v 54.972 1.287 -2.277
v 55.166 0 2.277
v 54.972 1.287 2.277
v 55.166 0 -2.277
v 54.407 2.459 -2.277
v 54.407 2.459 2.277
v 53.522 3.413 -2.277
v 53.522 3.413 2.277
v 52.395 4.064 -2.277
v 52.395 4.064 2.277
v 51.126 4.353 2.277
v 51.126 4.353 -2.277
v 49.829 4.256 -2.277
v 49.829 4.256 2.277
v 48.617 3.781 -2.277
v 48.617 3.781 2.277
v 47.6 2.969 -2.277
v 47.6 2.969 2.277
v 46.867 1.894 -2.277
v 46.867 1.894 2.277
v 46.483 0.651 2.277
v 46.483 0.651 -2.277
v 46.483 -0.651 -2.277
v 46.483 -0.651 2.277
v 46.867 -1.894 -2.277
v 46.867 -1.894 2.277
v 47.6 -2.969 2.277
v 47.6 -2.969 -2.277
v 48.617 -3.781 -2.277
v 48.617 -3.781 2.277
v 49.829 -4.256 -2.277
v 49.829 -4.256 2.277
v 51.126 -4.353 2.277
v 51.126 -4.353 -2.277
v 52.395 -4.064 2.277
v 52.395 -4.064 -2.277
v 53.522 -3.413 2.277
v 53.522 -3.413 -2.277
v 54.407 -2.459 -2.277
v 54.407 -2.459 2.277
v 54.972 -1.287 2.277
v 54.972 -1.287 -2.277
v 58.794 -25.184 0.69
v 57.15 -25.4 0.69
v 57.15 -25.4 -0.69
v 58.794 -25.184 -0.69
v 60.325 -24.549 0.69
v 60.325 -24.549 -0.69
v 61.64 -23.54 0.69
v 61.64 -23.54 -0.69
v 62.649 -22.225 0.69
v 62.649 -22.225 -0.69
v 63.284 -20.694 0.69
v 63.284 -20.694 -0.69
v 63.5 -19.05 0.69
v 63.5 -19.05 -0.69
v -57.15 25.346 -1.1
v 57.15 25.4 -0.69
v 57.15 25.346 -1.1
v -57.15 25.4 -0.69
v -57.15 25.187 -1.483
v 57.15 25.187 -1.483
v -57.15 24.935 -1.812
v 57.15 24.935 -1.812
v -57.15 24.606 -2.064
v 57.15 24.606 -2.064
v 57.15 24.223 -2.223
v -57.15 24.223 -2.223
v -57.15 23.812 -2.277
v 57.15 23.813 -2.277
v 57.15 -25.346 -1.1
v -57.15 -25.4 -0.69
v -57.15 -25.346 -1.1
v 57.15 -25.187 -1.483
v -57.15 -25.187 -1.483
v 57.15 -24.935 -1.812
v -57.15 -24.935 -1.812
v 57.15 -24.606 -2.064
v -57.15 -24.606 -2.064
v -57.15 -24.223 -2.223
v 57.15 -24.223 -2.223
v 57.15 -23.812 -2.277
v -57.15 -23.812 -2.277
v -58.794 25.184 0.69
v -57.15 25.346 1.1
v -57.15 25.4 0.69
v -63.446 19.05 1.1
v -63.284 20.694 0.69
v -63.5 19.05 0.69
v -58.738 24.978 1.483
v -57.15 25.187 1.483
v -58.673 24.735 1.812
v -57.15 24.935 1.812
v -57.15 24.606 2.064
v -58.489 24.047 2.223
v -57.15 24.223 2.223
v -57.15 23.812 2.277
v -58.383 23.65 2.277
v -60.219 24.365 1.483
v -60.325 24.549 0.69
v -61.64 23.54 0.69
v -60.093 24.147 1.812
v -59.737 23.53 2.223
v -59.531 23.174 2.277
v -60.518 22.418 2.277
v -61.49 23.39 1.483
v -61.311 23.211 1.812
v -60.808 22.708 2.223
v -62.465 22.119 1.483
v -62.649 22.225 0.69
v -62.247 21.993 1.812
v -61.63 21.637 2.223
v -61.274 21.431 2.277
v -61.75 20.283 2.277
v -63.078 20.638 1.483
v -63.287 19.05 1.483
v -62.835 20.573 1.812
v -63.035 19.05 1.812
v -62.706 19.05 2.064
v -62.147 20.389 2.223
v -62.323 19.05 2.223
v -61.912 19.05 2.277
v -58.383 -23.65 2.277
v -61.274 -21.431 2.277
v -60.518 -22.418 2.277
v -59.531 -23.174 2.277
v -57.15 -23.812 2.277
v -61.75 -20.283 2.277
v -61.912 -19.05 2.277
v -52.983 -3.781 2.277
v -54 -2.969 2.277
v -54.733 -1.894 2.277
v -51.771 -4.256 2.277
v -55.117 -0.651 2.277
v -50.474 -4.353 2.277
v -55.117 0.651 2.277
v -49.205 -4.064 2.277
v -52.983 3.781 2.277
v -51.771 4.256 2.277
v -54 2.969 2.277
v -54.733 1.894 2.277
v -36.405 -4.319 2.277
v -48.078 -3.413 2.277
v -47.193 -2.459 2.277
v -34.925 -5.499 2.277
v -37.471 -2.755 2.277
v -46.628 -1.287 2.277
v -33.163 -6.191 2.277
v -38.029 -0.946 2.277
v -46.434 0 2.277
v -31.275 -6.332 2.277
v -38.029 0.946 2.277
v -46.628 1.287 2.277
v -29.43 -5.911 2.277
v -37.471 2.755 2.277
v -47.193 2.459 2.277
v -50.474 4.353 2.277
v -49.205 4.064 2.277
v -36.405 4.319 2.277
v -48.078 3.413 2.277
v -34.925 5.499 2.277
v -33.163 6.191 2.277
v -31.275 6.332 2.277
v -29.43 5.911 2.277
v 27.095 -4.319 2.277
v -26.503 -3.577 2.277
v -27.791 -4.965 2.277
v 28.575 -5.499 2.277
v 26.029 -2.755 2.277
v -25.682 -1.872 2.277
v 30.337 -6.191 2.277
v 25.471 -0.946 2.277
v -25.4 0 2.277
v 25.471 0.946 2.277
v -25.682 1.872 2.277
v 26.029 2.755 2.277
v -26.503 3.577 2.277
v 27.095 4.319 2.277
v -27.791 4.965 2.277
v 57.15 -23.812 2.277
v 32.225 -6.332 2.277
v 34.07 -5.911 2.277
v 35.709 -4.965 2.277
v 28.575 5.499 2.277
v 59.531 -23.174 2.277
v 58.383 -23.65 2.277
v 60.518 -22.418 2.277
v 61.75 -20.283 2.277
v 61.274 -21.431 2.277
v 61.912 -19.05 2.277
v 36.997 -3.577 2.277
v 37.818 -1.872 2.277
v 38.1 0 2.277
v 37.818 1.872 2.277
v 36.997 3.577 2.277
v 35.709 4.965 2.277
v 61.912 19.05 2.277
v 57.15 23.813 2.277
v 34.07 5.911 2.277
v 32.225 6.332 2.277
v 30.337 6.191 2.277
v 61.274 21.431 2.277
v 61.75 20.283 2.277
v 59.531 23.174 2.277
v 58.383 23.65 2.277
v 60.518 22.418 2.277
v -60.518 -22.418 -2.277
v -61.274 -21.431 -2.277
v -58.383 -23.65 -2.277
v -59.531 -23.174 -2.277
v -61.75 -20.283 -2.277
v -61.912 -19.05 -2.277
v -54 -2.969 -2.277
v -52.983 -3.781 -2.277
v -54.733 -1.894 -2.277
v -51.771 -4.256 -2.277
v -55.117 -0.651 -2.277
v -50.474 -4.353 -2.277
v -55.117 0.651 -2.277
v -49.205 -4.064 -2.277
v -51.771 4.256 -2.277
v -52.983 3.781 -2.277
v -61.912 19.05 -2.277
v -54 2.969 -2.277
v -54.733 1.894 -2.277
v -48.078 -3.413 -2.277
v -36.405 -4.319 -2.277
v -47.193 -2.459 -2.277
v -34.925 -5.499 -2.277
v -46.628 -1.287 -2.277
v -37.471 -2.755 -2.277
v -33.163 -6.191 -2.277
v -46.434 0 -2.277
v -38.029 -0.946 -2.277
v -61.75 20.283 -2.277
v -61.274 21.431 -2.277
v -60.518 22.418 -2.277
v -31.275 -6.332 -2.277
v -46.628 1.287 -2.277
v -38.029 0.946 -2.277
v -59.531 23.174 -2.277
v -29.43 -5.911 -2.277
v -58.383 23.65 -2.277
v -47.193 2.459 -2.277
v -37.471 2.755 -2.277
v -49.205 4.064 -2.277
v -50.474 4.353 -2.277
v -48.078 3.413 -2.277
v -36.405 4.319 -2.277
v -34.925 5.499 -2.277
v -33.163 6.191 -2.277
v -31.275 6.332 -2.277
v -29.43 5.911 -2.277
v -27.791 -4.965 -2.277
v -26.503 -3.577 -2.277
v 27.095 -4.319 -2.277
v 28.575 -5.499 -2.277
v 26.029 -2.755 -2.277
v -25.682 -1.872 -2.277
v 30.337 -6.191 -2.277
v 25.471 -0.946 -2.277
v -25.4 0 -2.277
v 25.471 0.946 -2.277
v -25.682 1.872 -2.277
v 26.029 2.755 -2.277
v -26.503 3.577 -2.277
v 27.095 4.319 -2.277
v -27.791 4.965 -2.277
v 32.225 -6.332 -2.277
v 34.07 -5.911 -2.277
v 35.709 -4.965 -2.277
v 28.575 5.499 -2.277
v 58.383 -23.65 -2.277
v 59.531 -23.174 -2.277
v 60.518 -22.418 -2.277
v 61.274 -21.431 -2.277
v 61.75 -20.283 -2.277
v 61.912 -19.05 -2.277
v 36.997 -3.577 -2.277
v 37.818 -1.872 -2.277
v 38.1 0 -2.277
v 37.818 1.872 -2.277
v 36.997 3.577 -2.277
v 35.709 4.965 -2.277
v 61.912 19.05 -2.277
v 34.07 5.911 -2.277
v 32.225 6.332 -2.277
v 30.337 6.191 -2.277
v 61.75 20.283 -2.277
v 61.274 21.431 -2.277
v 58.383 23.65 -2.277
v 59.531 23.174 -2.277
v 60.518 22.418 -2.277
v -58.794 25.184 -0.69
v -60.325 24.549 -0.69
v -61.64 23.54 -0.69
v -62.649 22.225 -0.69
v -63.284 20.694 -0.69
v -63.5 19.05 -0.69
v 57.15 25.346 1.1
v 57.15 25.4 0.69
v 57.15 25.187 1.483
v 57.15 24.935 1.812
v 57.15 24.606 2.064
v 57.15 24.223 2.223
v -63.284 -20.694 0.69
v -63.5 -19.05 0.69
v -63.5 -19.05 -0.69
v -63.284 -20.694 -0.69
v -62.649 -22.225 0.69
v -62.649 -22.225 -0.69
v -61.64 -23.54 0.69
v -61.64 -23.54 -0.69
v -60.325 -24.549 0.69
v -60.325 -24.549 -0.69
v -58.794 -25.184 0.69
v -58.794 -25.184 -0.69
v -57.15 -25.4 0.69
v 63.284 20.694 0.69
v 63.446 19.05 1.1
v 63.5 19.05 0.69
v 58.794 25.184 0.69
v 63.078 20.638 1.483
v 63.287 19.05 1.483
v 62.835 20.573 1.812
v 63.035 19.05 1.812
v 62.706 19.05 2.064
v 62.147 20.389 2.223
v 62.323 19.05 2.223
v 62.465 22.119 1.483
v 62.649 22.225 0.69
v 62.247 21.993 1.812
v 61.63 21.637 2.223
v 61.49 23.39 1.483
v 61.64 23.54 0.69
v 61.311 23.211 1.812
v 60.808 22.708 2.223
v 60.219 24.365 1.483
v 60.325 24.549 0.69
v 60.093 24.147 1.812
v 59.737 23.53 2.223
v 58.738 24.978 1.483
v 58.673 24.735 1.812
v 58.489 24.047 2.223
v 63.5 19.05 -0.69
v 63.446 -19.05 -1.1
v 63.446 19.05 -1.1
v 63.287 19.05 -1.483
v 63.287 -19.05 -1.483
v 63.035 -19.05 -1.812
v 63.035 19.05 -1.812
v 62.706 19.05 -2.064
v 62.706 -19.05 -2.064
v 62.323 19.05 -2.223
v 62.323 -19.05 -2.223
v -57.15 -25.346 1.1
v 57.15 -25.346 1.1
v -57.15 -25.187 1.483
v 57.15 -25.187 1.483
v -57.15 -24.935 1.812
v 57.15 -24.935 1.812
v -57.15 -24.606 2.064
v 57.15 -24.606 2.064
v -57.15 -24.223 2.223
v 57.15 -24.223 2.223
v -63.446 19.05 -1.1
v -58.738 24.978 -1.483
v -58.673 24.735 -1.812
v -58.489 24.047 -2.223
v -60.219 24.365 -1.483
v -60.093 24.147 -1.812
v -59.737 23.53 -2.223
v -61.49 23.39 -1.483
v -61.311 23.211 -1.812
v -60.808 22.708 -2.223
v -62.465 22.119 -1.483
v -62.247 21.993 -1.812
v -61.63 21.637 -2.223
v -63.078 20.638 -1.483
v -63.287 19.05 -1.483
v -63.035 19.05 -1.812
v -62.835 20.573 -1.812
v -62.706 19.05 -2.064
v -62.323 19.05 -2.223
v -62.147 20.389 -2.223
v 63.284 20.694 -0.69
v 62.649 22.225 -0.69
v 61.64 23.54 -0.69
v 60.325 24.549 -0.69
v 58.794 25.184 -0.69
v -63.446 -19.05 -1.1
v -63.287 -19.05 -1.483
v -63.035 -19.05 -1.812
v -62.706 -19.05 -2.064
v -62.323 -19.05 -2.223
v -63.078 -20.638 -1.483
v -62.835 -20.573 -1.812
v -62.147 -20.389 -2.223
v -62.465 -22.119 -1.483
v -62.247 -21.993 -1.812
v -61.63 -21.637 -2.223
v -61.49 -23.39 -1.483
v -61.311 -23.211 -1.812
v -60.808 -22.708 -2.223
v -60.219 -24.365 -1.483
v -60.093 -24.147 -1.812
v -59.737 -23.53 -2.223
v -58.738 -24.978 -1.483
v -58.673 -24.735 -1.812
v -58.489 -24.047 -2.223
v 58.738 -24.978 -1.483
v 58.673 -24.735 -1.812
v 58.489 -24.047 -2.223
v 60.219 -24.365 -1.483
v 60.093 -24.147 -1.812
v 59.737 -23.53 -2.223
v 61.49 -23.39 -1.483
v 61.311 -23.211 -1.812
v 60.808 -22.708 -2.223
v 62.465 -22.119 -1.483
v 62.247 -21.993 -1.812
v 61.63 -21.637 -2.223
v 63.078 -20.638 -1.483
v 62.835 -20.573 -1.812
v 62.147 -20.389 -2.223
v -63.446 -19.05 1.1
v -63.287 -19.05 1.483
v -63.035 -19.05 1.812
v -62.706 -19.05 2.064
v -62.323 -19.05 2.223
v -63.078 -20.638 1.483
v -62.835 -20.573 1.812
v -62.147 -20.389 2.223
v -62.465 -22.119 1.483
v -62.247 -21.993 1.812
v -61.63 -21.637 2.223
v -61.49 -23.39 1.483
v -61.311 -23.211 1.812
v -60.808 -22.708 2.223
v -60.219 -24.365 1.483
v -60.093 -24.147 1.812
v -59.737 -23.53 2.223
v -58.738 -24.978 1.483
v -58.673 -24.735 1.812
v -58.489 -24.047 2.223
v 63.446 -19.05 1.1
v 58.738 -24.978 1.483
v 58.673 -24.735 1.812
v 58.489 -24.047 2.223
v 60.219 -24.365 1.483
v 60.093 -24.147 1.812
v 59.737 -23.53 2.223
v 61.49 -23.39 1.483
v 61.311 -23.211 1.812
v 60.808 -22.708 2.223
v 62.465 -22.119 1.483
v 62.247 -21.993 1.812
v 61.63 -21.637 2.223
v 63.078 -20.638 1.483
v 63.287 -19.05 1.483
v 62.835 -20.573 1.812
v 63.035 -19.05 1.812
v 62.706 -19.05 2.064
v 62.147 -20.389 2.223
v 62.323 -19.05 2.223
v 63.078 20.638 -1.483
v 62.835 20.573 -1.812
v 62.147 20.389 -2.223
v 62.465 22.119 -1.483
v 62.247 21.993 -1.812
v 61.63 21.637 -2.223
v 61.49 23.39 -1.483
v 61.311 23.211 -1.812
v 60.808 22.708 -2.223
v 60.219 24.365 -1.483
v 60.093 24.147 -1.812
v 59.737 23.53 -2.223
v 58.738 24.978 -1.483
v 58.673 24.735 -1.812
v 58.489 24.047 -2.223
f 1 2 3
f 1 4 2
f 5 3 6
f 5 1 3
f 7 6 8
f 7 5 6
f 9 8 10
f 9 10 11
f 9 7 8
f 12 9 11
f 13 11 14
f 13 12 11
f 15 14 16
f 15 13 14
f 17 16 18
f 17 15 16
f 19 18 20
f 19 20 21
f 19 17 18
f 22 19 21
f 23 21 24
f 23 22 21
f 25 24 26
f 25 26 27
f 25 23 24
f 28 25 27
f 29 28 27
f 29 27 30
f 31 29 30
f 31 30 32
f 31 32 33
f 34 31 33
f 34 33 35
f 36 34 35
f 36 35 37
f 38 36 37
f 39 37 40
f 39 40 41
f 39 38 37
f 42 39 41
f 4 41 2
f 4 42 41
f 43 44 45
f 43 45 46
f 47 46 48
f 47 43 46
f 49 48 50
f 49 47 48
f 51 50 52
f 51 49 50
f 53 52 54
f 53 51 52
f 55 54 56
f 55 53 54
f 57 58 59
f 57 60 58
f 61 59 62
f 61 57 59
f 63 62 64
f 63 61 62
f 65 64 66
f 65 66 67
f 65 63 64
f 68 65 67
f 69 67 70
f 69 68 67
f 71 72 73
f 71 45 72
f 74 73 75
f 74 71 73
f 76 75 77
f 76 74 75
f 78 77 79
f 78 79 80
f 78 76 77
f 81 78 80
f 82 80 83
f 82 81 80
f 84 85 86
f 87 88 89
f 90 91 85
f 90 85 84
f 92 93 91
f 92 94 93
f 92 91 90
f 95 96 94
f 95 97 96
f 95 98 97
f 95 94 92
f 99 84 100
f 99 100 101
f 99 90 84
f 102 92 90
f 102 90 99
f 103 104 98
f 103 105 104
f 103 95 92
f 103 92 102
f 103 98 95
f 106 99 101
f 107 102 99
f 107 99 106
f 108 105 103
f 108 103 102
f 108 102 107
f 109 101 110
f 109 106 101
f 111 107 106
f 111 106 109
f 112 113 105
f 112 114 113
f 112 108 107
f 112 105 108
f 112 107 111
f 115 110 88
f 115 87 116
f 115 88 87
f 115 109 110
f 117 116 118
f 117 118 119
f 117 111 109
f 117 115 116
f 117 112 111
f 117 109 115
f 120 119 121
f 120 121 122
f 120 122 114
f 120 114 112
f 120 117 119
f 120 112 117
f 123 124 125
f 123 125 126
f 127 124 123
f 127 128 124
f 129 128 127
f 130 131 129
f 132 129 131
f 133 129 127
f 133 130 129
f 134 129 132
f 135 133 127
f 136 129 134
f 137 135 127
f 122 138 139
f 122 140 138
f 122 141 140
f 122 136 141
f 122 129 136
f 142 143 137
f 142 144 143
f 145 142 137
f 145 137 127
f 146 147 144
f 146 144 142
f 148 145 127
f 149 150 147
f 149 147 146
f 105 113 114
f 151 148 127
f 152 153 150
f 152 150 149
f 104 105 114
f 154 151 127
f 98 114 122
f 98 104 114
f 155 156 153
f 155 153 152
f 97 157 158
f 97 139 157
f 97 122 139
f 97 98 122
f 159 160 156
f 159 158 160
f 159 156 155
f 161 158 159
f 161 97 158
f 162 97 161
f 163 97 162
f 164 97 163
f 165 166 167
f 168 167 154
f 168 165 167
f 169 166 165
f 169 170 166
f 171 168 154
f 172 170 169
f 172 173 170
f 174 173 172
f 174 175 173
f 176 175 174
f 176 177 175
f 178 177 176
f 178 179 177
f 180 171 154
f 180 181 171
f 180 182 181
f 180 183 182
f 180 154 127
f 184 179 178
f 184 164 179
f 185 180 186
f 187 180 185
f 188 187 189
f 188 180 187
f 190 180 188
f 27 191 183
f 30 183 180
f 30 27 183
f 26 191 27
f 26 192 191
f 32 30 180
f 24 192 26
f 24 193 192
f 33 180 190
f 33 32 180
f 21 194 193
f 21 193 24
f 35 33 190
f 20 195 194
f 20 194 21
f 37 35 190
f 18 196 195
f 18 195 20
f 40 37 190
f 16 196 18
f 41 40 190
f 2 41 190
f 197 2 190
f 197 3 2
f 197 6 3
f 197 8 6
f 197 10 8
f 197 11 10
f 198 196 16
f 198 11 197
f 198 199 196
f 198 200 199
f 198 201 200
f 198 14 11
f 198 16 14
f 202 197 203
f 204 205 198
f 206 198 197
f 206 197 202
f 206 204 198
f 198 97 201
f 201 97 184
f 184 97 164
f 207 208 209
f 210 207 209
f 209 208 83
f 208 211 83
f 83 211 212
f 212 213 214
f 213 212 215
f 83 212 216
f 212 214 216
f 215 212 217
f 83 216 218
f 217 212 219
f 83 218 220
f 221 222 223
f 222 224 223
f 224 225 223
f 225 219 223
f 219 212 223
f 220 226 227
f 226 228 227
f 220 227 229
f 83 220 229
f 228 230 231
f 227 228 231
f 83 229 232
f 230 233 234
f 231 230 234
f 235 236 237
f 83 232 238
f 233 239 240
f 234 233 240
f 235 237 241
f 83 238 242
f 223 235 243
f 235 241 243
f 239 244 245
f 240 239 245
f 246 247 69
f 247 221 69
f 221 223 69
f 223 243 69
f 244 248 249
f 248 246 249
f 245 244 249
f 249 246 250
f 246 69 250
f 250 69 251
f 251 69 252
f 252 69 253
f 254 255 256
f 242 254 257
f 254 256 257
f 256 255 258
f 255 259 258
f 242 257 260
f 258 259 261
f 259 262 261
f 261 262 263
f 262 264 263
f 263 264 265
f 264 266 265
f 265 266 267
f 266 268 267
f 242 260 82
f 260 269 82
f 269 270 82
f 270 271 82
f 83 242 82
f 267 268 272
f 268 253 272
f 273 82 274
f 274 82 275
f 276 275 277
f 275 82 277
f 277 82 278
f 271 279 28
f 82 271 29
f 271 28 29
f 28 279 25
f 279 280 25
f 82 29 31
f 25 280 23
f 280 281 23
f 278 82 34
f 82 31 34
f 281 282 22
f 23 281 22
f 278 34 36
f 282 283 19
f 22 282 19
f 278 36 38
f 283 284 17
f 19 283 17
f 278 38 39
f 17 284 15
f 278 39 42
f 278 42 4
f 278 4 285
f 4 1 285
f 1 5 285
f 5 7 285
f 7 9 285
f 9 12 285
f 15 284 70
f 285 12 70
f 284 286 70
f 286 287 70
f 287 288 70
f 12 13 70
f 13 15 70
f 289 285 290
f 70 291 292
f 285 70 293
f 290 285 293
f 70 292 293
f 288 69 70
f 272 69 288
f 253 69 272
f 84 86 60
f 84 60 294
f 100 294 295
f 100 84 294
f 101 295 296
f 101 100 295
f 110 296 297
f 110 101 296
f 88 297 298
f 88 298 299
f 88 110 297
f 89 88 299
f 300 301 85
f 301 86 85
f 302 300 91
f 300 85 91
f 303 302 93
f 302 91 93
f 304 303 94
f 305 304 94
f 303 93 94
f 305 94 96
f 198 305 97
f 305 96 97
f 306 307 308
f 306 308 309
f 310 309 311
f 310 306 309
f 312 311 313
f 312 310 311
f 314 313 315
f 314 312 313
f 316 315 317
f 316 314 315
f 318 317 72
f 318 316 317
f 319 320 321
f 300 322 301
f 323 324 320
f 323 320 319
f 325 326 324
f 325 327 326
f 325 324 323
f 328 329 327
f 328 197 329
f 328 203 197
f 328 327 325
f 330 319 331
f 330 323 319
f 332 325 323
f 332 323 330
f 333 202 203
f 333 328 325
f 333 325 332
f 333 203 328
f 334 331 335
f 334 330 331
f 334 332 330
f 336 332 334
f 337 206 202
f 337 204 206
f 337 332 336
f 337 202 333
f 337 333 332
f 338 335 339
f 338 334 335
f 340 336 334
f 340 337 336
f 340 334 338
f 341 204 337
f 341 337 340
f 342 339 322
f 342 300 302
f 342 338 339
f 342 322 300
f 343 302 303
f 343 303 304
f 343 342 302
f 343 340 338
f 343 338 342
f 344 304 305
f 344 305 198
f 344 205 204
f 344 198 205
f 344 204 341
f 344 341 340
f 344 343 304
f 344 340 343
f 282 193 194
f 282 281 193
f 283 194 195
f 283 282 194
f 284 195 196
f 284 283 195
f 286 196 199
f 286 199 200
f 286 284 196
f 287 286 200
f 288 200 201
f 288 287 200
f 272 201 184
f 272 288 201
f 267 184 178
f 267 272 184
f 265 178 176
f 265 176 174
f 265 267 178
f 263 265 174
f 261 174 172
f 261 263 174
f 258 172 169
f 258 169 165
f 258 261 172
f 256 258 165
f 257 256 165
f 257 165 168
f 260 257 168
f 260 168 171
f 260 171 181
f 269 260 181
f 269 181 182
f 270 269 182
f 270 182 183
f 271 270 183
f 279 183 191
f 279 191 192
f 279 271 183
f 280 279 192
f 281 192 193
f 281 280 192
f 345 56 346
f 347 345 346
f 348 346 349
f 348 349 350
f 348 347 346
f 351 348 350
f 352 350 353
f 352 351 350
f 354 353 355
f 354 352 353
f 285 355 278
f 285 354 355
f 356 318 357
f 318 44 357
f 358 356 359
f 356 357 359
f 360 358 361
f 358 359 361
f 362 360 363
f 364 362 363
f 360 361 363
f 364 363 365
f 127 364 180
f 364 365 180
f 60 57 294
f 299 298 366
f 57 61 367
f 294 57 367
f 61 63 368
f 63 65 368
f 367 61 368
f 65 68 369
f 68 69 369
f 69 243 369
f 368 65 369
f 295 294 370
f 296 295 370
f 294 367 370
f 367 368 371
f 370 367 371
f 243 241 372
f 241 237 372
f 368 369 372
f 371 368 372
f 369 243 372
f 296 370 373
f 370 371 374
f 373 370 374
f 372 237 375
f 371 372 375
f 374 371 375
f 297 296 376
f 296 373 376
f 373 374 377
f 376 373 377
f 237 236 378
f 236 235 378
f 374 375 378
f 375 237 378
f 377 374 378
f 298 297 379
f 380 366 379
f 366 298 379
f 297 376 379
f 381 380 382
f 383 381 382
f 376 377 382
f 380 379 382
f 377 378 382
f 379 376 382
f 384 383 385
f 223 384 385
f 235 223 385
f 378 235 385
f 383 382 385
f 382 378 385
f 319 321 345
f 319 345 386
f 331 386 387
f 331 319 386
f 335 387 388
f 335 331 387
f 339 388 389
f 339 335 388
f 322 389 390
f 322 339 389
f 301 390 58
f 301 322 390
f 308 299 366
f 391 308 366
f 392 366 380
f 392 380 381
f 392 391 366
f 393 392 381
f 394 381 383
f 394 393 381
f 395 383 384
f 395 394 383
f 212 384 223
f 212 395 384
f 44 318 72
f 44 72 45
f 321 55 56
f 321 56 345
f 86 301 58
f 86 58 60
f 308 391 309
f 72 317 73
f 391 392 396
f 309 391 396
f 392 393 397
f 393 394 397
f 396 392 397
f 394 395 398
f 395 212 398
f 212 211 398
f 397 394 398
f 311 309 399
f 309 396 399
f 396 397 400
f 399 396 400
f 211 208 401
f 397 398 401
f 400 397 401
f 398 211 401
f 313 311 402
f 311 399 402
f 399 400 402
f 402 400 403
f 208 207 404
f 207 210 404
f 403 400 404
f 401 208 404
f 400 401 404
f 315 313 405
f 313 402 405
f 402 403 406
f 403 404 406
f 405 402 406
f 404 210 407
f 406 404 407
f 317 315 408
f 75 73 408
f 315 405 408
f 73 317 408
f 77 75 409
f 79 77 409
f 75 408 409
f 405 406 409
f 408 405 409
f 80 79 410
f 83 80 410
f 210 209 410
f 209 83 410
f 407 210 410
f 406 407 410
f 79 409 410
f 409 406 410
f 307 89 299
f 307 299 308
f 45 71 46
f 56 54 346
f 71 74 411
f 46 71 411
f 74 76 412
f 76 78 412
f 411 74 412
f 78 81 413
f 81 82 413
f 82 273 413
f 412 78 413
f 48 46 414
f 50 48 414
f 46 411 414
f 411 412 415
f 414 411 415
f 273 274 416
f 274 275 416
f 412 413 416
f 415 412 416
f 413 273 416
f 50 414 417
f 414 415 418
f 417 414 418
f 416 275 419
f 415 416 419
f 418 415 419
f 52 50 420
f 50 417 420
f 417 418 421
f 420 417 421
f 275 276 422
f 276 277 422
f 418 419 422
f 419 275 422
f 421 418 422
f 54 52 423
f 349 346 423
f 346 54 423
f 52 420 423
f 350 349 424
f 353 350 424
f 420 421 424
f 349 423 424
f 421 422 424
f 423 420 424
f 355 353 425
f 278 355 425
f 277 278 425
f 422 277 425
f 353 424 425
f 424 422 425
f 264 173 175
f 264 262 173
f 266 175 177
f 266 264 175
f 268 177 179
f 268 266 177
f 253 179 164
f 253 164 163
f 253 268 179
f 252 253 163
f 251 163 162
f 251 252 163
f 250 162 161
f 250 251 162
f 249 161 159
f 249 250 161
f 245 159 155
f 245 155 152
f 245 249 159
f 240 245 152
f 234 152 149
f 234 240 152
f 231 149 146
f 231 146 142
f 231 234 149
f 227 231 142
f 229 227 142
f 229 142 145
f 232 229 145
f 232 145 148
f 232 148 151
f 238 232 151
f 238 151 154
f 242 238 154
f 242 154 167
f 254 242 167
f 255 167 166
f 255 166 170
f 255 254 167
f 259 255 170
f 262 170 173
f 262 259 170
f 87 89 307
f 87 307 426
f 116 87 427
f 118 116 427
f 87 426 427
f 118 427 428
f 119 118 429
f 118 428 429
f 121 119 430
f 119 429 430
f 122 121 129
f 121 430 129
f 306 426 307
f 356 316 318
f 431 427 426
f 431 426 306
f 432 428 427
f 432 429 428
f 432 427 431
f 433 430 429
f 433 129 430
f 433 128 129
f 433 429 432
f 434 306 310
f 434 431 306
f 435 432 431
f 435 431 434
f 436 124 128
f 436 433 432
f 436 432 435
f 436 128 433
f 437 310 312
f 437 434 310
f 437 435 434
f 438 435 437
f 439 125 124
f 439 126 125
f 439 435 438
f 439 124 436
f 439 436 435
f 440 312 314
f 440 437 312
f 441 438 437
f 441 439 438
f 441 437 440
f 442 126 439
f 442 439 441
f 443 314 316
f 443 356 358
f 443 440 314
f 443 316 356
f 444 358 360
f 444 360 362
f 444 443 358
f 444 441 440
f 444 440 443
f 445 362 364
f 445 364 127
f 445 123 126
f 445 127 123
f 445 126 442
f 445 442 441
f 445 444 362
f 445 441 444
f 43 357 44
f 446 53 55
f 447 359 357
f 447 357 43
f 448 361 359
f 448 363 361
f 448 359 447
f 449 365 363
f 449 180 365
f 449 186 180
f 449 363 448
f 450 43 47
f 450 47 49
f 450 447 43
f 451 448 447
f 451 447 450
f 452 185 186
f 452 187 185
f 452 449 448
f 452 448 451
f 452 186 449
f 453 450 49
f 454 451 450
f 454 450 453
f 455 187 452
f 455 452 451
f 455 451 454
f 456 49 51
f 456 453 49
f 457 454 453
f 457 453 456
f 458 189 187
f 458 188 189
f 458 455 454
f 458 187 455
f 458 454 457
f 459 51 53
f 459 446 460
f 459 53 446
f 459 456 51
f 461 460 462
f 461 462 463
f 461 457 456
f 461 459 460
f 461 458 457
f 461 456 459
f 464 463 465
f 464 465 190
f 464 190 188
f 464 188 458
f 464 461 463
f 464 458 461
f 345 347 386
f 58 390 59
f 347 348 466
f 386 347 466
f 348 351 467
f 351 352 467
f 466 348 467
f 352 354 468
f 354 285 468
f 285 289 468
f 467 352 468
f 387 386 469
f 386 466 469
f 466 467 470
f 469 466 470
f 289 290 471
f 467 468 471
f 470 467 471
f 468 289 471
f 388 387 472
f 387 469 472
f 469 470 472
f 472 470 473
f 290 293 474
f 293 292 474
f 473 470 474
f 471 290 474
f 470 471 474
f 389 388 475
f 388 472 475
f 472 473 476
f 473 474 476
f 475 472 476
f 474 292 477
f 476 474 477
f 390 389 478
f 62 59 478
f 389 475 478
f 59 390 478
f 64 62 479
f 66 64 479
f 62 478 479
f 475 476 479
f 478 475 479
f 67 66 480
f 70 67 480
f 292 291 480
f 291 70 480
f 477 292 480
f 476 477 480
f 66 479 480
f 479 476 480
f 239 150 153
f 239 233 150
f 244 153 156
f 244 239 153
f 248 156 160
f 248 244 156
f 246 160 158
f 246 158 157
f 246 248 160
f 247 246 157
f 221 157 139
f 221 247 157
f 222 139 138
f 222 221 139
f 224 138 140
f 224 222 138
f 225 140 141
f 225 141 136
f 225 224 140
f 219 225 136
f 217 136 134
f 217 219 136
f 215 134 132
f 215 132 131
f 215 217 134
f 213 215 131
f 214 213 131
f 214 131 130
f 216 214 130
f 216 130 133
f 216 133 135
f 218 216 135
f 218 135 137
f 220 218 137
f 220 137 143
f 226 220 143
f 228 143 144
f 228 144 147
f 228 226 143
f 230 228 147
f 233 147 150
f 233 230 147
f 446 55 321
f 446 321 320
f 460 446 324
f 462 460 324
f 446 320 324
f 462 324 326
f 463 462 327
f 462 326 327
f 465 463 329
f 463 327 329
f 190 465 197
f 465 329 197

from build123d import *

# Parameters (mm, degrees)
F0_R     = 4.365625
F0_R_2   = 6.35
F1_DEPTH = 2.27711
F2_R     = 1.5875


with BuildPart() as f1:
    # F0 (on Top) → F1 (new body, symmetric)
    with BuildSketch(Plane.XY):
        with BuildLine():
            Line((57.15, 25.4), (-57.15, 25.4))
            ThreePointArc((-57.15, 25.4), (-61.640128, 23.540128), (-63.5, 19.05))
            Line((-63.5, 19.05), (-63.5, -19.05))
            ThreePointArc((-63.5, -19.05), (-61.640128, -23.540128), (-57.15, -25.4))
            Line((-57.15, -25.4), (57.15, -25.4))
            ThreePointArc((57.15, -25.4), (61.640128, -23.540128), (63.5, -19.05))
            Line((63.5, -19.05), (63.5, 19.05))
            ThreePointArc((63.5, 19.05), (61.640128, 23.540128), (57.15, 25.4))
        make_face()
        with Locations((-50.8, 0)):
            Circle(F0_R, mode=Mode.SUBTRACT)
        with Locations((-31.75, 0)):
            Circle(F0_R_2, mode=Mode.SUBTRACT)
        with Locations((31.75, 0)):
            Circle(F0_R_2, mode=Mode.SUBTRACT)
        with Locations((50.8, 0)):
            Circle(F0_R, mode=Mode.SUBTRACT)
    extrude(amount=F1_DEPTH, both=True)

    # F2
    f2_edges = [f1.edges().sort_by_distance(p)[0] for p in [
        (0, -25.4, 2.27711),
        (0, -25.4, -2.27711),
    ]]
    fillet(f2_edges, radius=F2_R)


solid = f1.part
